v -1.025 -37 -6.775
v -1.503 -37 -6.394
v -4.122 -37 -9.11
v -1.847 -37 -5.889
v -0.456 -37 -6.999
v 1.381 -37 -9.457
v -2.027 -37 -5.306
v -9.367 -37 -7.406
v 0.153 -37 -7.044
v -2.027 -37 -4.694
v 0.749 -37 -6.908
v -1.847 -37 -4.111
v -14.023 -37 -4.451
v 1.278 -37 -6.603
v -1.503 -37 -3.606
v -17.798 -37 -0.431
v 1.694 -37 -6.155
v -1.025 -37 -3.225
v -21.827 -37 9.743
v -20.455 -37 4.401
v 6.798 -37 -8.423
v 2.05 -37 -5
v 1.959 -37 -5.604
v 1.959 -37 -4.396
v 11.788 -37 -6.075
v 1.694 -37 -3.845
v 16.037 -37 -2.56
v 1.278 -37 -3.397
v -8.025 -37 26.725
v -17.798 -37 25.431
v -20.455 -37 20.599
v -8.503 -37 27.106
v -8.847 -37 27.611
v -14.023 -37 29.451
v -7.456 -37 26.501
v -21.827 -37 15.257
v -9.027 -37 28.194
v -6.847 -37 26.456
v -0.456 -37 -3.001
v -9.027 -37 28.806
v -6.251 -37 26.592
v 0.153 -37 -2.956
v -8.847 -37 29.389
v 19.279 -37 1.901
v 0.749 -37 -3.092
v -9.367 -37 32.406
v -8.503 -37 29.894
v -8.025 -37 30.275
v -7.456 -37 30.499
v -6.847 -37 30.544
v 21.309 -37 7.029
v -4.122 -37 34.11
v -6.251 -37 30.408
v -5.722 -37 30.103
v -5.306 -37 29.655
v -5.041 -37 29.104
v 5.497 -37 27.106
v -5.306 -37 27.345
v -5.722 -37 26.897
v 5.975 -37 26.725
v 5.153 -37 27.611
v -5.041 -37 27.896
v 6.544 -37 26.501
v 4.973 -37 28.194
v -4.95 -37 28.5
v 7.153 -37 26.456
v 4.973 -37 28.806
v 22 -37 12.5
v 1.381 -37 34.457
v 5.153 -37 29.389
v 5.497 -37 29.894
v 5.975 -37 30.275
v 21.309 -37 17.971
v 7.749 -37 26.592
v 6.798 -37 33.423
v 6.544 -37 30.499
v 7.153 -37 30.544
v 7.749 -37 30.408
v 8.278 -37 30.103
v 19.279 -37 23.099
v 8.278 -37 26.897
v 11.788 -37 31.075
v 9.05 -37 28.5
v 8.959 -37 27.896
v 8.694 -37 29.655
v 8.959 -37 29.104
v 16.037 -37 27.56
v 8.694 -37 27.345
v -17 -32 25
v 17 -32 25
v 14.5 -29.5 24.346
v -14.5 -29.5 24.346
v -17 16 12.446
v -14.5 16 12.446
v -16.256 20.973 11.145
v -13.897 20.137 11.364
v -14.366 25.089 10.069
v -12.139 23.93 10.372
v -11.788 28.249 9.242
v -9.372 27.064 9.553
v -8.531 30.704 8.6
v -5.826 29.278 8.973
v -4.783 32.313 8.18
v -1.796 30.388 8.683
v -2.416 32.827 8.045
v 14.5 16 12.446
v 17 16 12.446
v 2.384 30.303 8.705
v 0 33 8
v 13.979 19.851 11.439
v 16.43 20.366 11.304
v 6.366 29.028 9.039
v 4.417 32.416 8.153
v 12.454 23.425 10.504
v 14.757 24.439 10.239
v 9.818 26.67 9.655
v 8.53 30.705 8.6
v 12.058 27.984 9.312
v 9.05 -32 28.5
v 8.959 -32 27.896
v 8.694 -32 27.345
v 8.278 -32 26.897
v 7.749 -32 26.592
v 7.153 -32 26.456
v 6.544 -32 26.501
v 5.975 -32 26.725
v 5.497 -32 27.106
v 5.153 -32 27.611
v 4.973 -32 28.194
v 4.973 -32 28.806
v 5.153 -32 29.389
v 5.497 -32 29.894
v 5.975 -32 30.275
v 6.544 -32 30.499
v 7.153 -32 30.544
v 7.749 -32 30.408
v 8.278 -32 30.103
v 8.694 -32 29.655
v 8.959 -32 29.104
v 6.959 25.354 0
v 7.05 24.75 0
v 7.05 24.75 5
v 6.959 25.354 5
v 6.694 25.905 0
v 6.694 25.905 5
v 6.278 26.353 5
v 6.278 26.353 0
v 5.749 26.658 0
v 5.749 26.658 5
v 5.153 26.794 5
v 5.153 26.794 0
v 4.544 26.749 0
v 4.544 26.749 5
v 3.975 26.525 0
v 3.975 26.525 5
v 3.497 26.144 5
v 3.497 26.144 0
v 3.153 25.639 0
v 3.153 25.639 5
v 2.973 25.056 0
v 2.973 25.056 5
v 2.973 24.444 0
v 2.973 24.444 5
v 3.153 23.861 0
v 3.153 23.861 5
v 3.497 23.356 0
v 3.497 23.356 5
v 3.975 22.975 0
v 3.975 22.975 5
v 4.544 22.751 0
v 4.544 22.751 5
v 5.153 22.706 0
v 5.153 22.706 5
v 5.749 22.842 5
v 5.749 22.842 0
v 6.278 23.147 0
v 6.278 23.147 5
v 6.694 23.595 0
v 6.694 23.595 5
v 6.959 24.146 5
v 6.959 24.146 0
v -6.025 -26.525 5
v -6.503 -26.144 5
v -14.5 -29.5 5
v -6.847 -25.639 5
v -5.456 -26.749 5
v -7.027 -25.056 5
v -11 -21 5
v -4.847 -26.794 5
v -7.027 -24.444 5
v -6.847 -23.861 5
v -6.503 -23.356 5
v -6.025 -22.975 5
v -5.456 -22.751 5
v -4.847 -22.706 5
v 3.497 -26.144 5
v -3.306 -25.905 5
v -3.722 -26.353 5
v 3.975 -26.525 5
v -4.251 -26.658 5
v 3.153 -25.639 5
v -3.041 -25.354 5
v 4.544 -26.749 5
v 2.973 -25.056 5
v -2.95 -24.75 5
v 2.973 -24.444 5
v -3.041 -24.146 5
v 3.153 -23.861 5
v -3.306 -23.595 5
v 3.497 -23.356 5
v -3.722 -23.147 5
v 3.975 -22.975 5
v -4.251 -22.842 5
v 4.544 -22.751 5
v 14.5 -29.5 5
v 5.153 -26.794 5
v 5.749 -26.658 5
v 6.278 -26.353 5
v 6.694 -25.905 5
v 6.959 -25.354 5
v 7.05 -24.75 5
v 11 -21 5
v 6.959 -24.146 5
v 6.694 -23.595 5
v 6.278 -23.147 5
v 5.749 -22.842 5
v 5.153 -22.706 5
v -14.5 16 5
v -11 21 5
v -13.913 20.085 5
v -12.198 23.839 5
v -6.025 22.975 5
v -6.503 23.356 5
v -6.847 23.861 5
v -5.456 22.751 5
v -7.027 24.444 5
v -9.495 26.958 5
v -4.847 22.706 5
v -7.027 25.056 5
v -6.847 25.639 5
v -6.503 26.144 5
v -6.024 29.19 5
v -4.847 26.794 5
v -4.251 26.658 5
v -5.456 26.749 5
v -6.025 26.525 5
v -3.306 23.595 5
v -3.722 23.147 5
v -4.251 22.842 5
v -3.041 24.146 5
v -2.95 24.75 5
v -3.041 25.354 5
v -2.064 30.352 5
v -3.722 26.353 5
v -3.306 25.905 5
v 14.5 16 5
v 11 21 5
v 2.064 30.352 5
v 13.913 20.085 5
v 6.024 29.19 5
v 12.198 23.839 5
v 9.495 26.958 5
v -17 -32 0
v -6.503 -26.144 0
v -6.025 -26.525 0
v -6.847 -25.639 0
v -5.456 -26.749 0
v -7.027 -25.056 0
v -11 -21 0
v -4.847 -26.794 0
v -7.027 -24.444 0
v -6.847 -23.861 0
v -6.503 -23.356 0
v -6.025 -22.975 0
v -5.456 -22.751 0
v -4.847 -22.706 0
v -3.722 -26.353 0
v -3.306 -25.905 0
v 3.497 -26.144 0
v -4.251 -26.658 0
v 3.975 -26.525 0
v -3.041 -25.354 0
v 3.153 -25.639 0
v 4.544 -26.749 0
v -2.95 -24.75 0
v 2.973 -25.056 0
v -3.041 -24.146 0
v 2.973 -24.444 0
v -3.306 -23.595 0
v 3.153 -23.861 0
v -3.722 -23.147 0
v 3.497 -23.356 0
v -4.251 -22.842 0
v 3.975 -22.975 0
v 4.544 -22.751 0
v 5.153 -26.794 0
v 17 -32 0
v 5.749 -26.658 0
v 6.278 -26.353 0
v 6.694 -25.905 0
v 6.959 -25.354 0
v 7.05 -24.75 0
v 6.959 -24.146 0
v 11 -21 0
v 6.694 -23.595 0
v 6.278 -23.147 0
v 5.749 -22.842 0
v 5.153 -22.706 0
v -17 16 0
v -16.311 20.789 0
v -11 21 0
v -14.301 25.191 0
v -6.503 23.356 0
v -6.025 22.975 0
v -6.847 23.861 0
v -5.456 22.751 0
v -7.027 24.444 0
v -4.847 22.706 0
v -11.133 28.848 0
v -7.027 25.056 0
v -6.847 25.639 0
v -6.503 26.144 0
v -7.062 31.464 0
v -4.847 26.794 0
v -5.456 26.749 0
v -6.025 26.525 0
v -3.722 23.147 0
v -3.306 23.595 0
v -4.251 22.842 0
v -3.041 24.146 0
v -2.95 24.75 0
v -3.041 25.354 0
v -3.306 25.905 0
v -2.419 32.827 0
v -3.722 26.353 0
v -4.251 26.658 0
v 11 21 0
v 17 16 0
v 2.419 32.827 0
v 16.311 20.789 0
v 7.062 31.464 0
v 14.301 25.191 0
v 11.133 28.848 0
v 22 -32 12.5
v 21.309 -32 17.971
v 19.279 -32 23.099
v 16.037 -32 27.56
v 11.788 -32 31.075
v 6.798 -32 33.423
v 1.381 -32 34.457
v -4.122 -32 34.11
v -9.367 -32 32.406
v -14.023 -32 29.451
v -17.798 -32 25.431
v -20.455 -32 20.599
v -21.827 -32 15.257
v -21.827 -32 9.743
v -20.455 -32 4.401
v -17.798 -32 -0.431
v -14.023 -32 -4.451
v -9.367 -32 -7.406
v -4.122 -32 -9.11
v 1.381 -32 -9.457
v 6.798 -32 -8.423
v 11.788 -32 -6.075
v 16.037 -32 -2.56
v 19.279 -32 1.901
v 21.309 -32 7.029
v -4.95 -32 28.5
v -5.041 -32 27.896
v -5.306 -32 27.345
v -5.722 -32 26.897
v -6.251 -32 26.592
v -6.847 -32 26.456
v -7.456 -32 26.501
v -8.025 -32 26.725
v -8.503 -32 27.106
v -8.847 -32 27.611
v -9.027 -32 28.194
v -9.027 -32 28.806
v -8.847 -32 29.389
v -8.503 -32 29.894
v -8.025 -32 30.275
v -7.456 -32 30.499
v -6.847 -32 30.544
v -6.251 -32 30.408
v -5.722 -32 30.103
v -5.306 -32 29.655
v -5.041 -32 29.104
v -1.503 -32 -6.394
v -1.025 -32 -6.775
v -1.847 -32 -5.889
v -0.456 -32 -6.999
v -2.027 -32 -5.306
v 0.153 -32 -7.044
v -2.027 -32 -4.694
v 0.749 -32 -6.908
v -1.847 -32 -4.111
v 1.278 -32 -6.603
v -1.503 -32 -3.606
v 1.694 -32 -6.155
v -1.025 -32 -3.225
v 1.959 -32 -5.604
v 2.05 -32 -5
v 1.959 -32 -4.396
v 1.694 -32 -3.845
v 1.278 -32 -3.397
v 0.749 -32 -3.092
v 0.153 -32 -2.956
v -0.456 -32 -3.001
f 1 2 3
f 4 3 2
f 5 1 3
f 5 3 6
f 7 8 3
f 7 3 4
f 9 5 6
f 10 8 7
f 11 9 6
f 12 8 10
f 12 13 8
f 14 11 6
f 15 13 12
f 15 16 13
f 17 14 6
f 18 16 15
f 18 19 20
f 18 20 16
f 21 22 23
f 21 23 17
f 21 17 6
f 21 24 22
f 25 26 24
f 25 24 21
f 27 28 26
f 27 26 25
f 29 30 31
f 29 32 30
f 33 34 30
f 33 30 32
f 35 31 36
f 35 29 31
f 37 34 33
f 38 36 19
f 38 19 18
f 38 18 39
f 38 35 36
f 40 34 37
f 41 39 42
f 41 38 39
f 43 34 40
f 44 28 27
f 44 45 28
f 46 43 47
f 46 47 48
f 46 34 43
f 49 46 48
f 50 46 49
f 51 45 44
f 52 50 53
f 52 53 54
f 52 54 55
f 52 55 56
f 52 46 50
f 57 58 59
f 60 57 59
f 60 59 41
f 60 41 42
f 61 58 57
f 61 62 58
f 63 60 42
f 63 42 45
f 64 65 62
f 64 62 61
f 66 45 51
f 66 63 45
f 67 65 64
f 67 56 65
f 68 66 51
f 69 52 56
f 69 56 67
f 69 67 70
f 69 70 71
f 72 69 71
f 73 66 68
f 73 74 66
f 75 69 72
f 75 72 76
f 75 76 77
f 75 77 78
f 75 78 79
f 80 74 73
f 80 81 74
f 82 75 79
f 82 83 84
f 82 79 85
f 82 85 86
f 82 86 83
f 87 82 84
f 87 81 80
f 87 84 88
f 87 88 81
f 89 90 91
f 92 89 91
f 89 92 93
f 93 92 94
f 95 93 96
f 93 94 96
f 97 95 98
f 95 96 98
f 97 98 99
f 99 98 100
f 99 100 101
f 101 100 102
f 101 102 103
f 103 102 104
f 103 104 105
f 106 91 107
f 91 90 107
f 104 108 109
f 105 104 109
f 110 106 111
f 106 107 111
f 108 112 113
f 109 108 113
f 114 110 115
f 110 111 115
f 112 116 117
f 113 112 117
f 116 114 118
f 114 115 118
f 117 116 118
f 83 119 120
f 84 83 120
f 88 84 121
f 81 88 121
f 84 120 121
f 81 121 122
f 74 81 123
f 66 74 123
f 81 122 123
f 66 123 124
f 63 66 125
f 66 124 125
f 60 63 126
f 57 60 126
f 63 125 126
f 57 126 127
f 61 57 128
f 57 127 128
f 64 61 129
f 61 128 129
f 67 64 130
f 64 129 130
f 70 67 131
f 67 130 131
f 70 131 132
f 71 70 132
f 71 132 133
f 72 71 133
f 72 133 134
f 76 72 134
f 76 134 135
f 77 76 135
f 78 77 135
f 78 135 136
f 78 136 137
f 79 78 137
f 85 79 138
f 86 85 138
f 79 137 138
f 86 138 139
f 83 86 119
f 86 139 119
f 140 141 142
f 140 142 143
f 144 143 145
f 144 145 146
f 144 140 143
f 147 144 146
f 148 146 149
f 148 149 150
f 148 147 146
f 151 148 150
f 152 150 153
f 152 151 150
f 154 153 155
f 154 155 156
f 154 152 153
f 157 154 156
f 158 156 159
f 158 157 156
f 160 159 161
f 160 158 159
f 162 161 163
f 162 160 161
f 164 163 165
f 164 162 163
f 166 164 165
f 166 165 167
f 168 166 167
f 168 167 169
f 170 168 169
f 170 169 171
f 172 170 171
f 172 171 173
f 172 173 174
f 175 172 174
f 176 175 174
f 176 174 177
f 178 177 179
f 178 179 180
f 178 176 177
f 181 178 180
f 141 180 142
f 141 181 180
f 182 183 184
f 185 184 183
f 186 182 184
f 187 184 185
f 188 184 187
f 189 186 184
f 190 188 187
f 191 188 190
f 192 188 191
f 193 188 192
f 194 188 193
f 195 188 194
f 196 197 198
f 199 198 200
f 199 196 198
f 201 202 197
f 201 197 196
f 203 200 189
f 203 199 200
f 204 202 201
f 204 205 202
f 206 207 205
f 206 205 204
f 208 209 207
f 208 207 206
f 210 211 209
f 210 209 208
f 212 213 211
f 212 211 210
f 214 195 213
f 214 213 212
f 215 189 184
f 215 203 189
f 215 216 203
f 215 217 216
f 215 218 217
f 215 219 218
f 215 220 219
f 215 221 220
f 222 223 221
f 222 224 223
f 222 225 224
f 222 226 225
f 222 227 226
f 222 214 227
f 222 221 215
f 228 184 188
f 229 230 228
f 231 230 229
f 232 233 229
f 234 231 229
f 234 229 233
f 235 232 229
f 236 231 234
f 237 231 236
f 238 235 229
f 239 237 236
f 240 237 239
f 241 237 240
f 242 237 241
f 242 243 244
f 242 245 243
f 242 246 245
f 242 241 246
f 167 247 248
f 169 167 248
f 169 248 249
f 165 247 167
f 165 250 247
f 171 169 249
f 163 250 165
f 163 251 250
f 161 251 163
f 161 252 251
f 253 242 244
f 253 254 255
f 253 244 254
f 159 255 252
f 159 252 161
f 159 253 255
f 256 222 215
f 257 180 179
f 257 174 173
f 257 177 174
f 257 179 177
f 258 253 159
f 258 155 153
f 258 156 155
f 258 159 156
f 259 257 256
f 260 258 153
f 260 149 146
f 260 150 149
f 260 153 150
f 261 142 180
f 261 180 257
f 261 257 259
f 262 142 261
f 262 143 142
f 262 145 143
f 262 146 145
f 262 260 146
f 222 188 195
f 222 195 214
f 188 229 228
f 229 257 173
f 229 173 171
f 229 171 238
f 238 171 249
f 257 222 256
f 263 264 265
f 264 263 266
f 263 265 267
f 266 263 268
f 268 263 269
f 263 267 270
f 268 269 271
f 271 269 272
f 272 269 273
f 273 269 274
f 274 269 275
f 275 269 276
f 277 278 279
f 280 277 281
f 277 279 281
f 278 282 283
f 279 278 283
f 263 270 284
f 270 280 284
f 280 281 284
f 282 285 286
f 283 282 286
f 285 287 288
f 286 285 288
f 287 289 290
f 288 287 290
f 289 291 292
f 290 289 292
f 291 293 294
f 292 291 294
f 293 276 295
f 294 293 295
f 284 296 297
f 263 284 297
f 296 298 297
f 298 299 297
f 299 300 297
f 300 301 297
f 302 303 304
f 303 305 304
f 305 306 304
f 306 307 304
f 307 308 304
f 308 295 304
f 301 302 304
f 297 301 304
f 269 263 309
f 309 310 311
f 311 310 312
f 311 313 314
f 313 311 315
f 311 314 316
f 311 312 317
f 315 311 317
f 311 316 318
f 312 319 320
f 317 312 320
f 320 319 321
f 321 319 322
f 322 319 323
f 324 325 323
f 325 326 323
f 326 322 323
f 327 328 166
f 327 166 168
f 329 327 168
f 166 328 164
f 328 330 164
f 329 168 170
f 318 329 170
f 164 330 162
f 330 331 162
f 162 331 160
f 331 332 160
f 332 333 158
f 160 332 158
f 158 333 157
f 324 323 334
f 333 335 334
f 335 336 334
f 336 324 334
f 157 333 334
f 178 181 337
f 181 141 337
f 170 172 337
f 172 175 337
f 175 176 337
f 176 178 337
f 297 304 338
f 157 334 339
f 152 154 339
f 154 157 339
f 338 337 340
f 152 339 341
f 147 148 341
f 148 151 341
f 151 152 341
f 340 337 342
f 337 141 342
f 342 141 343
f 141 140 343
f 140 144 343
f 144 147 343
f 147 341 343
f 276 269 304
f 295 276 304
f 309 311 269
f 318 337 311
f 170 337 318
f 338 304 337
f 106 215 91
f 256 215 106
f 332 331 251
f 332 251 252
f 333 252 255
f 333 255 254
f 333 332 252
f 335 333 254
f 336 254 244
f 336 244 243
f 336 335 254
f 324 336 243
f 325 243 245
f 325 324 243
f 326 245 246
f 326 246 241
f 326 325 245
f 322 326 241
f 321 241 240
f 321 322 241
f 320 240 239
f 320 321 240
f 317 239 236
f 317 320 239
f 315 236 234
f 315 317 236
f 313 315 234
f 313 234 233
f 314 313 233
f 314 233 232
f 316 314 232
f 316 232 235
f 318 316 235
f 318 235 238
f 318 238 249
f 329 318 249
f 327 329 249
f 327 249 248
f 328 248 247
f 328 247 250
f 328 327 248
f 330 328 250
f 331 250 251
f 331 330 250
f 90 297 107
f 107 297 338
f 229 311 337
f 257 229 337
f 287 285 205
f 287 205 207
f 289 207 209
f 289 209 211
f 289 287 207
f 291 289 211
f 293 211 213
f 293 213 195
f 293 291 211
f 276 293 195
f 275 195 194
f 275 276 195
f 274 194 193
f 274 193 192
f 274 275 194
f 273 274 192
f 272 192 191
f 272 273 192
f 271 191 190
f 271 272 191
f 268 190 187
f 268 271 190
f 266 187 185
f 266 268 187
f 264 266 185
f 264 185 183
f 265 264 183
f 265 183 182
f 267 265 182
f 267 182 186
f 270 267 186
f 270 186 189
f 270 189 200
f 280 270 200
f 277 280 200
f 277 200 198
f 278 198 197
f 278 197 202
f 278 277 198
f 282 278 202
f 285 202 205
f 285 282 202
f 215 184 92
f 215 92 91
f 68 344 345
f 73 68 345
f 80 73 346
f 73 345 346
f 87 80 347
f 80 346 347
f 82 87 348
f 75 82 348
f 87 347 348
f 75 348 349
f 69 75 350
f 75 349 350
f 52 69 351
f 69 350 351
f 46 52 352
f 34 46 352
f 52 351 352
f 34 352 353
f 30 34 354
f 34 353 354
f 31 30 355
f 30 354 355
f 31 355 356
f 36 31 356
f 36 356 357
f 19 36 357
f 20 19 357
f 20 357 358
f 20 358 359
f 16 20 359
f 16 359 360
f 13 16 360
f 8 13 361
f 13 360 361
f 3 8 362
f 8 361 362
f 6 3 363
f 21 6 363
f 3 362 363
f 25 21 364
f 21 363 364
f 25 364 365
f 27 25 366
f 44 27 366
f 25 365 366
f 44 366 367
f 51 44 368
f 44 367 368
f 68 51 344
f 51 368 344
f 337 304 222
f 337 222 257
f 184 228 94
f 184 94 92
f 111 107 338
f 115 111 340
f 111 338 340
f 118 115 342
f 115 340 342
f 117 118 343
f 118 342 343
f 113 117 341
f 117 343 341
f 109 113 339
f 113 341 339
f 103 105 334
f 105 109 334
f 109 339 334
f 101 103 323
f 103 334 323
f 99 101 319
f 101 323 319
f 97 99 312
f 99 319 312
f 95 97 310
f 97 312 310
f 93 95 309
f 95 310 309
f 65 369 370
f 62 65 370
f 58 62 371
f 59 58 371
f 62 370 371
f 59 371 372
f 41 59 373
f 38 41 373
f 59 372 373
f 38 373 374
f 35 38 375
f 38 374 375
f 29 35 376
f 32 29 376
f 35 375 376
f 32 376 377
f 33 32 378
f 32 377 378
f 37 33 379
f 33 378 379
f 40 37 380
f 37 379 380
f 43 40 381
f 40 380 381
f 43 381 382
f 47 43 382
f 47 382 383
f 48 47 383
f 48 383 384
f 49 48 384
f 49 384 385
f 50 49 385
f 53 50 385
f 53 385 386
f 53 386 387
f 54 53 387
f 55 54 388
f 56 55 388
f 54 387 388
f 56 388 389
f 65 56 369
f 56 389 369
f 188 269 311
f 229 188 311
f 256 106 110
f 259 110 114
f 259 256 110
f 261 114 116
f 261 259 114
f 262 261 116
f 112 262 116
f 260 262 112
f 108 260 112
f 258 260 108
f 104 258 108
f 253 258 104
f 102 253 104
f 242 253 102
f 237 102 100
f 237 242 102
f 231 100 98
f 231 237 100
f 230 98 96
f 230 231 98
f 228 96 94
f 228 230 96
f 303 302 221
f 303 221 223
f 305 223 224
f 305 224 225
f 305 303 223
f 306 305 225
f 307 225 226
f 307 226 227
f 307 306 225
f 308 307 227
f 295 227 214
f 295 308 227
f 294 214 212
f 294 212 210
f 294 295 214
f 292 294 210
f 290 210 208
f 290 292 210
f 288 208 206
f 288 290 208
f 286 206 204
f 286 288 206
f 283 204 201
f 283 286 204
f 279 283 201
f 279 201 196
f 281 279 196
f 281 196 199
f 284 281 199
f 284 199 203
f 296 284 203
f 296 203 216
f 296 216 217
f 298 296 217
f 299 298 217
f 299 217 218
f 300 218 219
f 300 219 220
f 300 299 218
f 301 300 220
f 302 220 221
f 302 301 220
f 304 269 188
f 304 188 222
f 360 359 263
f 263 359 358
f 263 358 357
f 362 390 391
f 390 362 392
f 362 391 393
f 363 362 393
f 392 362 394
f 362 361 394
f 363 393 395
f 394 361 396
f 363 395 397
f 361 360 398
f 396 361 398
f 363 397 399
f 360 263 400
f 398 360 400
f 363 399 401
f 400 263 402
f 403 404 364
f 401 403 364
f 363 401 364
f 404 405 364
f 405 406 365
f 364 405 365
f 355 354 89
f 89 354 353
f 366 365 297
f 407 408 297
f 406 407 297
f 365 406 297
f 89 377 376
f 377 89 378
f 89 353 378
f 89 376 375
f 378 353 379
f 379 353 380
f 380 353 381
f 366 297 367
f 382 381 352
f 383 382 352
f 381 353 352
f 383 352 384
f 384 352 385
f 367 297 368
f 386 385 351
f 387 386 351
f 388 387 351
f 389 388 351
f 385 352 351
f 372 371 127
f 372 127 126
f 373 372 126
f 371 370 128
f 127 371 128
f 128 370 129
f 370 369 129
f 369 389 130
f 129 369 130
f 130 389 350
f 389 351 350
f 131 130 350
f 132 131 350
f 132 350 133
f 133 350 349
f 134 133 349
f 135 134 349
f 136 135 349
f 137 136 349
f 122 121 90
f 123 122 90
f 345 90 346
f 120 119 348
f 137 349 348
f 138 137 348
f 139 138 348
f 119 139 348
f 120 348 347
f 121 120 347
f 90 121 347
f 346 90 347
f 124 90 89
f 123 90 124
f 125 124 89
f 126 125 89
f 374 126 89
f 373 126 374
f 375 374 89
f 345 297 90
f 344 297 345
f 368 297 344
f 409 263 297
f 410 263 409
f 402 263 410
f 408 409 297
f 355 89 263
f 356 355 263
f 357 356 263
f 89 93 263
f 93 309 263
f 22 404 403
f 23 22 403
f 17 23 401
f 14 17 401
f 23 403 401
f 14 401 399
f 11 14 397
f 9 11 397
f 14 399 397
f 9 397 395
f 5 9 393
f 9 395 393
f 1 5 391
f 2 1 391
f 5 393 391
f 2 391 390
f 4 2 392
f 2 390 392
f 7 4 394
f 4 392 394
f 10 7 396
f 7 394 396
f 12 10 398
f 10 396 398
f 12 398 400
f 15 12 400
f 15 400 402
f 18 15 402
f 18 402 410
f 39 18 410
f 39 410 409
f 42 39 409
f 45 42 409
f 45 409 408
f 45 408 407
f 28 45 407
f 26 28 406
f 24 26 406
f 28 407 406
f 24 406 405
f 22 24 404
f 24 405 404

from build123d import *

# Parameters (mm, degrees)
SKETCH1_W           = 22
SKETCH1_H           = 42
SKETCH1_R           = 2.05
BOSS_EXTRUDE1_DEPTH = 5
BOSS_EXTRUDE2_DEPTH = 20
CUT_EXTRUDE1_DEPTH  = 35
SKETCH4_R           = 22
BOSS_EXTRUDE3_DEPTH = 5
SKETCH5_R           = 2.05
CUT_EXTRUDE2_DEPTH  = 5


with BuildPart() as part:
    # Sketch1 → Boss-Extrude1 (new body)
    with BuildSketch(Plane.XY):
        with BuildLine():
            Line((17, -32), (17, 16))
            ThreePointArc((17, 16), (0, 33), (-17, 16))
            Line((-17, 16), (-17, -32))
            Line((-17, -32), (17, -32))
        make_face()
        Rectangle(SKETCH1_W, SKETCH1_H, mode=Mode.SUBTRACT)
        with Locations((-5, -24.75)):
            Circle(SKETCH1_R, mode=Mode.SUBTRACT)
        with Locations((5, -24.75)):
            Circle(SKETCH1_R, mode=Mode.SUBTRACT)
        with Locations((-5, 24.75)):
            Circle(SKETCH1_R, mode=Mode.SUBTRACT)
        with Locations((5, 24.75)):
            Circle(SKETCH1_R, mode=Mode.SUBTRACT)
    extrude(amount=BOSS_EXTRUDE1_DEPTH)

    # Sketch2 → Boss-Extrude2 (add)
    with BuildSketch(Plane.XY.offset(5)):
        with BuildLine():
            Line((17, -32), (17, 16))
            ThreePointArc((17, 16), (0, 33), (-17, 16))
            Line((-17, 16), (-17, -32))
            Line((-17, -32), (17, -32))
        make_face()
        with BuildLine():
            Line((-14.5, 16), (-14.5, -29.5))
            Line((-14.5, -29.5), (14.5, -29.5))
            Line((14.5, -29.5), (14.5, 16))
            ThreePointArc((14.5, 16), (0, 30.5), (-14.5, 16))
        make_face(mode=Mode.SUBTRACT)
    extrude(amount=BOSS_EXTRUDE2_DEPTH)

    # Sketch3 → Cut-Extrude1 (cut, through all)
    with BuildSketch(Plane(origin=(17, 0, 0), x_dir=(0, 0, -1), z_dir=(1, 0, 0))):
        Polygon((-25, -32), (-8, 33), (-25, 33), align=None)
    extrude(amount=-CUT_EXTRUDE1_DEPTH, mode=Mode.SUBTRACT)

    # Sketch4 → Boss-Extrude3 (add)
    with BuildSketch(Plane.XZ.offset(32)):
        with Locations((0, 12.5)):
            Circle(SKETCH4_R)
    extrude(amount=BOSS_EXTRUDE3_DEPTH)

    # Sketch5 → Cut-Extrude2 (cut)
    with BuildSketch(Plane(origin=(0, -32, 0), x_dir=(1, 0, 0), z_dir=(0, 1, 0))):
        with Locations((0, 5)):
            Circle(SKETCH5_R)
        with Locations((-7, -28.5)):
            Circle(SKETCH5_R)
        with Locations((7, -28.5)):
            Circle(SKETCH5_R)
    extrude(amount=-CUT_EXTRUDE2_DEPTH, mode=Mode.SUBTRACT)


solid = part.part
